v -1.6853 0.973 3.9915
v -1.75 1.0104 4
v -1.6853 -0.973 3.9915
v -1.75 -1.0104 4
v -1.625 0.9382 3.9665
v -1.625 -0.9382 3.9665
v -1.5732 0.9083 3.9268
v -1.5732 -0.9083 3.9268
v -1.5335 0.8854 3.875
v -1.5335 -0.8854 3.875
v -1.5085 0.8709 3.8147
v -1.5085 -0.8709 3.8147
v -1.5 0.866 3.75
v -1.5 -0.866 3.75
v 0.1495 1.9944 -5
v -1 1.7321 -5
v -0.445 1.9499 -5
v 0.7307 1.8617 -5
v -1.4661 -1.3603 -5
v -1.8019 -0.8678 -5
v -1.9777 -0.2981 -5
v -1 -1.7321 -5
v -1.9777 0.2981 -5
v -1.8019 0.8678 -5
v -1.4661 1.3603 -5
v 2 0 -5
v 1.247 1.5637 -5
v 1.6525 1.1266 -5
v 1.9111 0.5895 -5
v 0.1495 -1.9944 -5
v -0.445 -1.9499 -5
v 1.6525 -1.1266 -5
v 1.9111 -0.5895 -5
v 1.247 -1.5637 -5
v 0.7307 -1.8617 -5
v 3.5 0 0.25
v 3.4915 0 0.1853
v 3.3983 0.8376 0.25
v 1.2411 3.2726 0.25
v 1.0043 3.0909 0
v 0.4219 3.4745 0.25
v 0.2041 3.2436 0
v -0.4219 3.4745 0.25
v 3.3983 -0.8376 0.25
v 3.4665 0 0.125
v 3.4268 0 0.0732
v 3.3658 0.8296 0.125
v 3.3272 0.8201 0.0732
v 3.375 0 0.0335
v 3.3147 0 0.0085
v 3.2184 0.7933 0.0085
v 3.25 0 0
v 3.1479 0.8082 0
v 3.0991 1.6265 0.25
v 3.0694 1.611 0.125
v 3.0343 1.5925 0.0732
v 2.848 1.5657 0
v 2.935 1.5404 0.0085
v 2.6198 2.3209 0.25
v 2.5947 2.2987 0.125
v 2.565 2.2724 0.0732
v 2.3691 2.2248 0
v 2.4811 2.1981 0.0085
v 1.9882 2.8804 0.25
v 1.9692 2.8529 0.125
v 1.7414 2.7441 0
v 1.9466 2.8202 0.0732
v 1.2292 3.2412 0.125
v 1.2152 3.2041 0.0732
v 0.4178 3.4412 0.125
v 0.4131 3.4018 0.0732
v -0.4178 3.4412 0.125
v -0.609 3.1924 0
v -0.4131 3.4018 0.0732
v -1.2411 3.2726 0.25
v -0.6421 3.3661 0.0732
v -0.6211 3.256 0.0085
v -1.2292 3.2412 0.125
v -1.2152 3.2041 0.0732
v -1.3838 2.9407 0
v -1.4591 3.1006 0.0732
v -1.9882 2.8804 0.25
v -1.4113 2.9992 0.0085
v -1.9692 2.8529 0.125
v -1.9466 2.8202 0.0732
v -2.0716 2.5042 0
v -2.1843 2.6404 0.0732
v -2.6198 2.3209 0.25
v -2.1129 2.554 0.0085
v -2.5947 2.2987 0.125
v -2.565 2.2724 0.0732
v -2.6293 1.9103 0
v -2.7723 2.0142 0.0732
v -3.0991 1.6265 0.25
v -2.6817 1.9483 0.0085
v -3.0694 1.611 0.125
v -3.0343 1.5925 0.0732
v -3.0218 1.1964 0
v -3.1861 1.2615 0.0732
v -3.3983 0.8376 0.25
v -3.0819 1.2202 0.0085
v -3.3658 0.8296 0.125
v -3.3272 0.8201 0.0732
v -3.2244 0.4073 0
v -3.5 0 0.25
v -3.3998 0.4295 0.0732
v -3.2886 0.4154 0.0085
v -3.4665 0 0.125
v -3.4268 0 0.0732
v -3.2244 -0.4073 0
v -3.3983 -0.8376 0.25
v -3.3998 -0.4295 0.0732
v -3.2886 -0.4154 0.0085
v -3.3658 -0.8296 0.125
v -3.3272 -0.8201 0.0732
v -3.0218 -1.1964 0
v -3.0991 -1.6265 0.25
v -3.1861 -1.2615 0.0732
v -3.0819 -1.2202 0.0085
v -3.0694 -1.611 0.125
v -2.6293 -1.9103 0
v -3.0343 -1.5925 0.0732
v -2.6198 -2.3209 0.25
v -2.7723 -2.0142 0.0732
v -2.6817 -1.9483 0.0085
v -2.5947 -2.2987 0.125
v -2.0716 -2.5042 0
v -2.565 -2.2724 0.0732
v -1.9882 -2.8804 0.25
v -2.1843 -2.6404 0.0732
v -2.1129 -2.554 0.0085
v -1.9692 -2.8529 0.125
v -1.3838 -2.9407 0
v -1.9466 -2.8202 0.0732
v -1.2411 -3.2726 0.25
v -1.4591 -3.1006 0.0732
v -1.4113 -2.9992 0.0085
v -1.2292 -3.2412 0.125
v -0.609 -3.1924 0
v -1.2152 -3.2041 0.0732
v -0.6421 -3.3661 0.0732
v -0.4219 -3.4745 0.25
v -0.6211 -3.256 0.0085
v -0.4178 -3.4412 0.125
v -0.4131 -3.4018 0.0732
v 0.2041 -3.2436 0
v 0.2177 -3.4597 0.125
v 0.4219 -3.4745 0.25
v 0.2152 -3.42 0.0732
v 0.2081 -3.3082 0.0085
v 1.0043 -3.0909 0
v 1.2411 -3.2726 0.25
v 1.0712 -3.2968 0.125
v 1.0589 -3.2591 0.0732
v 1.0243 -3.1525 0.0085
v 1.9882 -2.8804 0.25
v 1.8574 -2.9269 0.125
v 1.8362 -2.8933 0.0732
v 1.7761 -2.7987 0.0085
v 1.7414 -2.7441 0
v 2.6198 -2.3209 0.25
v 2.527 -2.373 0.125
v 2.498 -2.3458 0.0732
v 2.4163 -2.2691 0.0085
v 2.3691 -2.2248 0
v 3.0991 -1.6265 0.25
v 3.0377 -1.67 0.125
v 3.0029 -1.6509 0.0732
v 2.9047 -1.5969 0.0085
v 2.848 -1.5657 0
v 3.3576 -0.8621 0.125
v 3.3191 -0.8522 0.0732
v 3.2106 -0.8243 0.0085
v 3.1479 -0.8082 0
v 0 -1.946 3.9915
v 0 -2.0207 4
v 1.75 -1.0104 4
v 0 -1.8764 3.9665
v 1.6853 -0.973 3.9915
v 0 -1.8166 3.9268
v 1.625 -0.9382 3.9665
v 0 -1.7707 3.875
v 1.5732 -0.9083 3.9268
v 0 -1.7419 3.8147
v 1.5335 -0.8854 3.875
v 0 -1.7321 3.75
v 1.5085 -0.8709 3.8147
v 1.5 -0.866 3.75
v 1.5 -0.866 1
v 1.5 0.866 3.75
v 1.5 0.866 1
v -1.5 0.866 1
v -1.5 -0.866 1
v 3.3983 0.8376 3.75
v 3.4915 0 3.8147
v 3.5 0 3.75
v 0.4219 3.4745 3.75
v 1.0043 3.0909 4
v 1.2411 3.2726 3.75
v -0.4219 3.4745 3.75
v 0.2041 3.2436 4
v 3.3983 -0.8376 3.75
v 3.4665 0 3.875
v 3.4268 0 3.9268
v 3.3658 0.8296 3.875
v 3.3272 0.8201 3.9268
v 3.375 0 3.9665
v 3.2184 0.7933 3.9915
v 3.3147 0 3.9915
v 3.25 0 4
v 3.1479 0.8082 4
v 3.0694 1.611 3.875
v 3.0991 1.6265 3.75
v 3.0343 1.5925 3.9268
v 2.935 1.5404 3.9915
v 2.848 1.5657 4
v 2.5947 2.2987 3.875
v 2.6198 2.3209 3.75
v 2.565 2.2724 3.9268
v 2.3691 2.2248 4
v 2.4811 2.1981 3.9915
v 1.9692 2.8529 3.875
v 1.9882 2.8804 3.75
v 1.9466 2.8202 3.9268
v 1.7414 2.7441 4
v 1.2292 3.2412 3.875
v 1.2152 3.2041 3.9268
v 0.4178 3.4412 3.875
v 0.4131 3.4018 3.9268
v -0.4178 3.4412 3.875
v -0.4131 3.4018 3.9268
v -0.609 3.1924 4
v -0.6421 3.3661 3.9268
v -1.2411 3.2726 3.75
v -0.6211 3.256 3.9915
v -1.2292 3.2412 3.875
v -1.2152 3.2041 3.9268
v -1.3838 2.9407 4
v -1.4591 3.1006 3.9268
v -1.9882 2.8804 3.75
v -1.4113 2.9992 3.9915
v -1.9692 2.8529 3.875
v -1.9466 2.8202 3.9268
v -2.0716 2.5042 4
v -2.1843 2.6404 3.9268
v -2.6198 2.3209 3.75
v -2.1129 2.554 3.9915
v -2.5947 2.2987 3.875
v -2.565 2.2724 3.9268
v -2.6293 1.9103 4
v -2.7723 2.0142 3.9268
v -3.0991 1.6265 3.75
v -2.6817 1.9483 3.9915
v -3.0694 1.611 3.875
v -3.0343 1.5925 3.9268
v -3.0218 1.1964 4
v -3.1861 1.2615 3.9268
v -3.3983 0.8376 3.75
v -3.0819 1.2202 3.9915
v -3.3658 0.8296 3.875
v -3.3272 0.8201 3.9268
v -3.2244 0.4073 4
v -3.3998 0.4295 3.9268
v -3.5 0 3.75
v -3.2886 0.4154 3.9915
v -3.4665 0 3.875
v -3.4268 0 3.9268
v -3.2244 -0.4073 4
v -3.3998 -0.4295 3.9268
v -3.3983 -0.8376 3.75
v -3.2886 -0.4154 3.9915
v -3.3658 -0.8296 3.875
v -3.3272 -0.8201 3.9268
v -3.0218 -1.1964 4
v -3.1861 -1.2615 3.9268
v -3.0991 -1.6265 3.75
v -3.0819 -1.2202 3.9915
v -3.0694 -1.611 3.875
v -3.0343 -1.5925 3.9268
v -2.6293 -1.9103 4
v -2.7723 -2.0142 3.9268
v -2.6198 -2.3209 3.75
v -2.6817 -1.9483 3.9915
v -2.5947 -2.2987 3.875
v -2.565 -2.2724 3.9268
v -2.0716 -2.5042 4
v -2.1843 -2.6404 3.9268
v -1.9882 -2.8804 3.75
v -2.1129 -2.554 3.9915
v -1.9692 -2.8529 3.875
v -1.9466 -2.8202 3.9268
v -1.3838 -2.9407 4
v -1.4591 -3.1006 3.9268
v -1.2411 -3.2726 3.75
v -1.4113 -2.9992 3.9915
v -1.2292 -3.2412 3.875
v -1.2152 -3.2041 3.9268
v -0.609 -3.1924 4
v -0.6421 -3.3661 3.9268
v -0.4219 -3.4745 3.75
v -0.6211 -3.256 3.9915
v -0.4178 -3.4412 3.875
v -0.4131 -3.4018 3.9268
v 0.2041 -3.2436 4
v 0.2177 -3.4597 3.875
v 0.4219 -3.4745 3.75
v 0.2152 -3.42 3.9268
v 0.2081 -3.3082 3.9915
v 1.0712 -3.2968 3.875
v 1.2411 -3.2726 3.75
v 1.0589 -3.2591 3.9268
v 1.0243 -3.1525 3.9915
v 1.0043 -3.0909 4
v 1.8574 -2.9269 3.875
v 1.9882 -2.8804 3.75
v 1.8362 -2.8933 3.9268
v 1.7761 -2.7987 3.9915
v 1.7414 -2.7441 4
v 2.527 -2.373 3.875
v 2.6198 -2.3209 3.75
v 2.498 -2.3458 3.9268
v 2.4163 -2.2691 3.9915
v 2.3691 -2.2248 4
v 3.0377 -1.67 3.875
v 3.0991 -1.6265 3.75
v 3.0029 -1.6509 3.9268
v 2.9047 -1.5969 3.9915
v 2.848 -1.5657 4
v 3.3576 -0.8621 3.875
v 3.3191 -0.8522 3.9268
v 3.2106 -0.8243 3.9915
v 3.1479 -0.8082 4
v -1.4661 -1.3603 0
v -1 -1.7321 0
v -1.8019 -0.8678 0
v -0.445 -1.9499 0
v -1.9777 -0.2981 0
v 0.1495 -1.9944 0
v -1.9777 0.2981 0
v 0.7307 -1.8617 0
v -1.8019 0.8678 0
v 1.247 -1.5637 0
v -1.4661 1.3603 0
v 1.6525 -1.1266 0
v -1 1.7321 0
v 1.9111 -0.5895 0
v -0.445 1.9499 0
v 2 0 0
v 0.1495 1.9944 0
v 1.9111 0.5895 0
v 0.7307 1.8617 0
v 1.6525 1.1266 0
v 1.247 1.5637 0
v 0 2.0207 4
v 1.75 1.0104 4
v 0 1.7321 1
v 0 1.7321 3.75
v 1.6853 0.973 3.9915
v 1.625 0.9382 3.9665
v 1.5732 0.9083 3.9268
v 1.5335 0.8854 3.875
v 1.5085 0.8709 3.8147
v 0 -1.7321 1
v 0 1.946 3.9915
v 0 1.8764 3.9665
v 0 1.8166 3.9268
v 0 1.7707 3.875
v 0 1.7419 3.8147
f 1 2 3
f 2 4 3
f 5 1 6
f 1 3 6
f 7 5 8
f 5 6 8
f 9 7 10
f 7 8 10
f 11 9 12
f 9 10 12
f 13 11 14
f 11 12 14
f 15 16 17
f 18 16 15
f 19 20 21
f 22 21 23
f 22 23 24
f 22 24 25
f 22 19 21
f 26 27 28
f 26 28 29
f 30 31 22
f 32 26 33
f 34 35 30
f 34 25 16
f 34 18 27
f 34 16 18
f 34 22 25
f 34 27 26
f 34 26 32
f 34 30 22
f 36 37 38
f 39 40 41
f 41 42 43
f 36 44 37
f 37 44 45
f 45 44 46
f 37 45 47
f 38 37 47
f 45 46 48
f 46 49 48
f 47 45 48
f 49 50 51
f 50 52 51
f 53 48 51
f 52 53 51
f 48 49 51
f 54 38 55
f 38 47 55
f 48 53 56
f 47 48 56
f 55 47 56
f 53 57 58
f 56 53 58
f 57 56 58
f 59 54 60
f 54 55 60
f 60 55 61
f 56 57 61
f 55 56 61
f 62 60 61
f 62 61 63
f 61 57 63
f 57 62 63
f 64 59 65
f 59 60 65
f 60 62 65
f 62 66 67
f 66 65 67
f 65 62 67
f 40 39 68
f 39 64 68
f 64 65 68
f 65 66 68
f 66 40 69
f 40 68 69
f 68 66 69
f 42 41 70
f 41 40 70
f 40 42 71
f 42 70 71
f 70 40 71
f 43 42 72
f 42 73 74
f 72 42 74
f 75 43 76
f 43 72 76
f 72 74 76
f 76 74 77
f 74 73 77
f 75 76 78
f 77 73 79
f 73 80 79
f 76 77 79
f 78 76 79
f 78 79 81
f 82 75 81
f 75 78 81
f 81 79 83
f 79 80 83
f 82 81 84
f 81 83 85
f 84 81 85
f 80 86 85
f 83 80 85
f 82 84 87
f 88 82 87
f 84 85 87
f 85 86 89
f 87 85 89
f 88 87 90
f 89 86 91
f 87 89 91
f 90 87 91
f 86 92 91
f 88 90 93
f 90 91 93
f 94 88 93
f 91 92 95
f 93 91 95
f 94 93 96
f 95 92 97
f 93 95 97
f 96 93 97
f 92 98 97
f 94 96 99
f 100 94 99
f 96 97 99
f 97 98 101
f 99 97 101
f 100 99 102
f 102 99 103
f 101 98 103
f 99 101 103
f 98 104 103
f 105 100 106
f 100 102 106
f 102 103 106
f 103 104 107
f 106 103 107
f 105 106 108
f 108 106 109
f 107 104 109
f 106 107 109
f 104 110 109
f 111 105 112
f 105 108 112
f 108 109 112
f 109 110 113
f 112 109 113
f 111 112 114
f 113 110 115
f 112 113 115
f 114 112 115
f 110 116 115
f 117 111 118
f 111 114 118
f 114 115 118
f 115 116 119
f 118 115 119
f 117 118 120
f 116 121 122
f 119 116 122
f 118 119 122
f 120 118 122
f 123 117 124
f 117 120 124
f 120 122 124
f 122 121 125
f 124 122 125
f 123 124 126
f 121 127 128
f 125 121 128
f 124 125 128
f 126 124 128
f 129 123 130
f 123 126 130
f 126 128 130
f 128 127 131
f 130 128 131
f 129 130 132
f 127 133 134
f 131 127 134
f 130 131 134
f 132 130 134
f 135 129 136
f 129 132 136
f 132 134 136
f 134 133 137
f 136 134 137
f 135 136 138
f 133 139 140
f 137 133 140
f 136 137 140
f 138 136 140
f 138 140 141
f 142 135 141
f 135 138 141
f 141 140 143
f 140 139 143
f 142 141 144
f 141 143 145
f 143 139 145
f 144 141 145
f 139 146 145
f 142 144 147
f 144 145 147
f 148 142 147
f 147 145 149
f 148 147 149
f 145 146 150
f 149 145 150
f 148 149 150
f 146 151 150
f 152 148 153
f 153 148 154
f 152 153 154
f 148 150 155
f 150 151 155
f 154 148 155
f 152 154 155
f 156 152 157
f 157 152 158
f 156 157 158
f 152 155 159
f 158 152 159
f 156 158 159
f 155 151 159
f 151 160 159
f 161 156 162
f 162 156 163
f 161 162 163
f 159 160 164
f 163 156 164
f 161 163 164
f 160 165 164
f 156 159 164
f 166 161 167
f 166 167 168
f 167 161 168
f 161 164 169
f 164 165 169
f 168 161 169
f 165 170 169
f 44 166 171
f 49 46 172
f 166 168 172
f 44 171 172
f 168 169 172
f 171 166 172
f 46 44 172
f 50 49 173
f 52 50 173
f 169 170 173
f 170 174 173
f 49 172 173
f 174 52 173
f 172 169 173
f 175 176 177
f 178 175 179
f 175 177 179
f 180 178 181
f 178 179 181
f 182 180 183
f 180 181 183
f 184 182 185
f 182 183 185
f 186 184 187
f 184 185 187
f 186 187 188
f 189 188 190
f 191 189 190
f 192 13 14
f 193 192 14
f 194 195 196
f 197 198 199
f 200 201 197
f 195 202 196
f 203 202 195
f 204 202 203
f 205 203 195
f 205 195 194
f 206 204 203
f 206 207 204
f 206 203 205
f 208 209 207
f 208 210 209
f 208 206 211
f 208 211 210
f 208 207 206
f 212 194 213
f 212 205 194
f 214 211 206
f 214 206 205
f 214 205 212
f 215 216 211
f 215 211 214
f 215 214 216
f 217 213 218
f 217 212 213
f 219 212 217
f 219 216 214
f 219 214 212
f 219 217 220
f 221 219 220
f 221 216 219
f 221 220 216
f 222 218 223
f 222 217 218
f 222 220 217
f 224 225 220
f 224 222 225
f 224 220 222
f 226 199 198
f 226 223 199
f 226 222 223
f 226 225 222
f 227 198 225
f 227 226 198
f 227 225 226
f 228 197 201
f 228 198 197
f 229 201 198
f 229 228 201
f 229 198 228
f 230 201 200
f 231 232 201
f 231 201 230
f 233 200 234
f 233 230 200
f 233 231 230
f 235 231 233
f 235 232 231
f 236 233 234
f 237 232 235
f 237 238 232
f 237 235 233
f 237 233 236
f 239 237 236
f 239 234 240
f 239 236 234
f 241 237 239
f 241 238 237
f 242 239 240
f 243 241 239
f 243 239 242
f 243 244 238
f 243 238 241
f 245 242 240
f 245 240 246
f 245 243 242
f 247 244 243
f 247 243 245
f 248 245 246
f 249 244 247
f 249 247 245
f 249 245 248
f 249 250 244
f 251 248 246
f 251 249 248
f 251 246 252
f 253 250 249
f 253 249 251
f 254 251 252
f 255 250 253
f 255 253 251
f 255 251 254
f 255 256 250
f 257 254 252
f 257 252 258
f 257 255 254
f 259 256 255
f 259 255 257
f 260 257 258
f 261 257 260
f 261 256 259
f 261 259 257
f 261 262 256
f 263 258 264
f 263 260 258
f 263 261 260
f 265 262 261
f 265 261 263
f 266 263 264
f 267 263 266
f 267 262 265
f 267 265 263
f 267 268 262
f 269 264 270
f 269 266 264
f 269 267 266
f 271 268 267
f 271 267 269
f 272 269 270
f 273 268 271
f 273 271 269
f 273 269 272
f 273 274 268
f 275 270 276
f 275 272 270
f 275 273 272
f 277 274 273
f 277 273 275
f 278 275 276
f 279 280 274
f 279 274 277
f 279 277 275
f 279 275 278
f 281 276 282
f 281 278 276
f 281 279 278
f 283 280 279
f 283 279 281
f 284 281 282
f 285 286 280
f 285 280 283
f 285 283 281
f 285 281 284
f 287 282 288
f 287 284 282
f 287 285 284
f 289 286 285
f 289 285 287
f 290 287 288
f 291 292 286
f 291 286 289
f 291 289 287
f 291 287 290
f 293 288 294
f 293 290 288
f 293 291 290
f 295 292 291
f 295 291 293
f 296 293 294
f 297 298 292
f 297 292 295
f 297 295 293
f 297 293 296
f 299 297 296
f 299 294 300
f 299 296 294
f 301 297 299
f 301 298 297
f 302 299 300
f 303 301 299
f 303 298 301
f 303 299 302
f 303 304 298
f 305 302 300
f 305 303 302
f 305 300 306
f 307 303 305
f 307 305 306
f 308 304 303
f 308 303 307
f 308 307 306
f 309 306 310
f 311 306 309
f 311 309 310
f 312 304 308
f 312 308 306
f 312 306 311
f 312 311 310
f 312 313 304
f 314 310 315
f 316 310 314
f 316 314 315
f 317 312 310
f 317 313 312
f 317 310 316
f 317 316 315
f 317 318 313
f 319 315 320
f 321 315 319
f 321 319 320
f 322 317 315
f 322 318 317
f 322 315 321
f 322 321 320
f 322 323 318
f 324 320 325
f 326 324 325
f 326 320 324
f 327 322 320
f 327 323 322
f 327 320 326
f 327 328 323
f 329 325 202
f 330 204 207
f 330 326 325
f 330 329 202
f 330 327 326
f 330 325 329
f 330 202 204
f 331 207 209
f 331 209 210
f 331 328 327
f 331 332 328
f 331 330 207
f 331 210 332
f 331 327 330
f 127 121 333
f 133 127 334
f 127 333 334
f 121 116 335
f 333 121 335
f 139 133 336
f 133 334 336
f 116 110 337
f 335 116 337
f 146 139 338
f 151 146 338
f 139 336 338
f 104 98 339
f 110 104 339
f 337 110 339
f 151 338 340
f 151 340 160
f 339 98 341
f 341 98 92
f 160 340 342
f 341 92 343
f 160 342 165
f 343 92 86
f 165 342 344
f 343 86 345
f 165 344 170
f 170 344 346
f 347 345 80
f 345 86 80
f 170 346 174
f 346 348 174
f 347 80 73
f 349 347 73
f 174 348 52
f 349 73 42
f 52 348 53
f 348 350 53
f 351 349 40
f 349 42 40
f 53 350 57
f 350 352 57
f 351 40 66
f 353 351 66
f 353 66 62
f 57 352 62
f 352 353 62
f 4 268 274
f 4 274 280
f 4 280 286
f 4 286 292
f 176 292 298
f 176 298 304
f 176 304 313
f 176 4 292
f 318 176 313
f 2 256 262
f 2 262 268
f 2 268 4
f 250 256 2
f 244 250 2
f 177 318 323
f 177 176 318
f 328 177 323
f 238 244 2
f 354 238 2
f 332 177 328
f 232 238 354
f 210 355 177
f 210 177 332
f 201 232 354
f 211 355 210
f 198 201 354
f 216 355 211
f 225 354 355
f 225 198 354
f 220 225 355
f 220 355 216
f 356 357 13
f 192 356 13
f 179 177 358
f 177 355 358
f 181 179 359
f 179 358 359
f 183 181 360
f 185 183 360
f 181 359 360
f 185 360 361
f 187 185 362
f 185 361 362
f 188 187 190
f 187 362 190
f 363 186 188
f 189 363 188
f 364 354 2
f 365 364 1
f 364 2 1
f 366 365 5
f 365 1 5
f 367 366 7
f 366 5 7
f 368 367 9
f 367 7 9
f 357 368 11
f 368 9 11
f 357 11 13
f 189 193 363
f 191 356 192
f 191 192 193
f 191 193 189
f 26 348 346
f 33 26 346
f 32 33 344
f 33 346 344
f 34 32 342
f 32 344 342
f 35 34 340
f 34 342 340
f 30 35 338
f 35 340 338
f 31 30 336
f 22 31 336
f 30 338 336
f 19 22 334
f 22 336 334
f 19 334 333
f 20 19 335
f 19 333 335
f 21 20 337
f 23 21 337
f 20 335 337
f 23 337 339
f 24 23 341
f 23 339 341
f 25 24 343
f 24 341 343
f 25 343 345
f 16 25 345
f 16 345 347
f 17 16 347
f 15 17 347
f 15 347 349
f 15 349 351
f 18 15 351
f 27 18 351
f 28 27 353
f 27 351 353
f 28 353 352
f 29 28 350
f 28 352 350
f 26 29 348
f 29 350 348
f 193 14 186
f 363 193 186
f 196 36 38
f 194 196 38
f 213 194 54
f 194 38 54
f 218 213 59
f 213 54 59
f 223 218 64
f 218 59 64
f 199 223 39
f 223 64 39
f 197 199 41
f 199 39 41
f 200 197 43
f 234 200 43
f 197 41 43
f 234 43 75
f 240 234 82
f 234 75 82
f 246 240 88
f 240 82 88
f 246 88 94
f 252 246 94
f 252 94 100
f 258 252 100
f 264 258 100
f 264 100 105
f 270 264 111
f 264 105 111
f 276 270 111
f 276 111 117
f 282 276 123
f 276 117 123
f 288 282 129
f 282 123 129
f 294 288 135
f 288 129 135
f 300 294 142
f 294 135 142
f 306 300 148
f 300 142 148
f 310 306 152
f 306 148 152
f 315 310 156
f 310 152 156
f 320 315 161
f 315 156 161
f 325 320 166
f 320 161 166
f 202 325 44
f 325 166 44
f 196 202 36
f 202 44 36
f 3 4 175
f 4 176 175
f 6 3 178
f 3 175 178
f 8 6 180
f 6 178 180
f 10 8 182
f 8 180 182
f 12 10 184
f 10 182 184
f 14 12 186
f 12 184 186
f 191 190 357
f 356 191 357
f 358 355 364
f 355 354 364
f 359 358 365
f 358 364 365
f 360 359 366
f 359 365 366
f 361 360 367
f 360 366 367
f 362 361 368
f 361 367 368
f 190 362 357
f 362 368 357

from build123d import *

# Parameters (mm, degrees)
F0_R     = 3.5
F1_DEPTH = 4
F2_R     = 2
F3_DEPTH = 5
F5_DEPTH = 3
F6_R     = 0.25


with BuildPart() as f1:
    # F0 (on Top) → F1 (new body)
    with BuildSketch(Plane.XY):
        Circle(F0_R)
    extrude(amount=F1_DEPTH)

    # F2 (on face) → F3 (join)
    with BuildSketch(Plane(origin=(0, 0, 0), x_dir=(1, 0, 0), z_dir=(0, 0, -1))):
        Circle(F2_R)
    extrude(amount=F3_DEPTH)

    # F4 (on face) → F5 (cut)
    with BuildSketch(Plane.XY.offset(4)):
        Polygon((1.5, -0.8660254038), (1.5, 0.8660254038), (0, 1.7320508076), (-1.5, 0.8660254038), (-1.5, -0.8660254038), (0, -1.7320508076), align=None)
    extrude(amount=-F5_DEPTH, mode=Mode.SUBTRACT)

    # F6
    f6_edges = [f1.edges().sort_by_distance(p)[0] for p in [
        (-3.5, 0, 4),
        (1.5, 0, 4),
        (0.75, 1.299038, 4),
        (-0.75, 1.299038, 4),
        (-1.5, 0, 4),
        (-0.75, -1.299038, 4),
        (0.75, -1.299038, 4),
        (-3.5, 0, 0),
    ]]
    fillet(f6_edges, radius=F6_R)


solid = f1.part
